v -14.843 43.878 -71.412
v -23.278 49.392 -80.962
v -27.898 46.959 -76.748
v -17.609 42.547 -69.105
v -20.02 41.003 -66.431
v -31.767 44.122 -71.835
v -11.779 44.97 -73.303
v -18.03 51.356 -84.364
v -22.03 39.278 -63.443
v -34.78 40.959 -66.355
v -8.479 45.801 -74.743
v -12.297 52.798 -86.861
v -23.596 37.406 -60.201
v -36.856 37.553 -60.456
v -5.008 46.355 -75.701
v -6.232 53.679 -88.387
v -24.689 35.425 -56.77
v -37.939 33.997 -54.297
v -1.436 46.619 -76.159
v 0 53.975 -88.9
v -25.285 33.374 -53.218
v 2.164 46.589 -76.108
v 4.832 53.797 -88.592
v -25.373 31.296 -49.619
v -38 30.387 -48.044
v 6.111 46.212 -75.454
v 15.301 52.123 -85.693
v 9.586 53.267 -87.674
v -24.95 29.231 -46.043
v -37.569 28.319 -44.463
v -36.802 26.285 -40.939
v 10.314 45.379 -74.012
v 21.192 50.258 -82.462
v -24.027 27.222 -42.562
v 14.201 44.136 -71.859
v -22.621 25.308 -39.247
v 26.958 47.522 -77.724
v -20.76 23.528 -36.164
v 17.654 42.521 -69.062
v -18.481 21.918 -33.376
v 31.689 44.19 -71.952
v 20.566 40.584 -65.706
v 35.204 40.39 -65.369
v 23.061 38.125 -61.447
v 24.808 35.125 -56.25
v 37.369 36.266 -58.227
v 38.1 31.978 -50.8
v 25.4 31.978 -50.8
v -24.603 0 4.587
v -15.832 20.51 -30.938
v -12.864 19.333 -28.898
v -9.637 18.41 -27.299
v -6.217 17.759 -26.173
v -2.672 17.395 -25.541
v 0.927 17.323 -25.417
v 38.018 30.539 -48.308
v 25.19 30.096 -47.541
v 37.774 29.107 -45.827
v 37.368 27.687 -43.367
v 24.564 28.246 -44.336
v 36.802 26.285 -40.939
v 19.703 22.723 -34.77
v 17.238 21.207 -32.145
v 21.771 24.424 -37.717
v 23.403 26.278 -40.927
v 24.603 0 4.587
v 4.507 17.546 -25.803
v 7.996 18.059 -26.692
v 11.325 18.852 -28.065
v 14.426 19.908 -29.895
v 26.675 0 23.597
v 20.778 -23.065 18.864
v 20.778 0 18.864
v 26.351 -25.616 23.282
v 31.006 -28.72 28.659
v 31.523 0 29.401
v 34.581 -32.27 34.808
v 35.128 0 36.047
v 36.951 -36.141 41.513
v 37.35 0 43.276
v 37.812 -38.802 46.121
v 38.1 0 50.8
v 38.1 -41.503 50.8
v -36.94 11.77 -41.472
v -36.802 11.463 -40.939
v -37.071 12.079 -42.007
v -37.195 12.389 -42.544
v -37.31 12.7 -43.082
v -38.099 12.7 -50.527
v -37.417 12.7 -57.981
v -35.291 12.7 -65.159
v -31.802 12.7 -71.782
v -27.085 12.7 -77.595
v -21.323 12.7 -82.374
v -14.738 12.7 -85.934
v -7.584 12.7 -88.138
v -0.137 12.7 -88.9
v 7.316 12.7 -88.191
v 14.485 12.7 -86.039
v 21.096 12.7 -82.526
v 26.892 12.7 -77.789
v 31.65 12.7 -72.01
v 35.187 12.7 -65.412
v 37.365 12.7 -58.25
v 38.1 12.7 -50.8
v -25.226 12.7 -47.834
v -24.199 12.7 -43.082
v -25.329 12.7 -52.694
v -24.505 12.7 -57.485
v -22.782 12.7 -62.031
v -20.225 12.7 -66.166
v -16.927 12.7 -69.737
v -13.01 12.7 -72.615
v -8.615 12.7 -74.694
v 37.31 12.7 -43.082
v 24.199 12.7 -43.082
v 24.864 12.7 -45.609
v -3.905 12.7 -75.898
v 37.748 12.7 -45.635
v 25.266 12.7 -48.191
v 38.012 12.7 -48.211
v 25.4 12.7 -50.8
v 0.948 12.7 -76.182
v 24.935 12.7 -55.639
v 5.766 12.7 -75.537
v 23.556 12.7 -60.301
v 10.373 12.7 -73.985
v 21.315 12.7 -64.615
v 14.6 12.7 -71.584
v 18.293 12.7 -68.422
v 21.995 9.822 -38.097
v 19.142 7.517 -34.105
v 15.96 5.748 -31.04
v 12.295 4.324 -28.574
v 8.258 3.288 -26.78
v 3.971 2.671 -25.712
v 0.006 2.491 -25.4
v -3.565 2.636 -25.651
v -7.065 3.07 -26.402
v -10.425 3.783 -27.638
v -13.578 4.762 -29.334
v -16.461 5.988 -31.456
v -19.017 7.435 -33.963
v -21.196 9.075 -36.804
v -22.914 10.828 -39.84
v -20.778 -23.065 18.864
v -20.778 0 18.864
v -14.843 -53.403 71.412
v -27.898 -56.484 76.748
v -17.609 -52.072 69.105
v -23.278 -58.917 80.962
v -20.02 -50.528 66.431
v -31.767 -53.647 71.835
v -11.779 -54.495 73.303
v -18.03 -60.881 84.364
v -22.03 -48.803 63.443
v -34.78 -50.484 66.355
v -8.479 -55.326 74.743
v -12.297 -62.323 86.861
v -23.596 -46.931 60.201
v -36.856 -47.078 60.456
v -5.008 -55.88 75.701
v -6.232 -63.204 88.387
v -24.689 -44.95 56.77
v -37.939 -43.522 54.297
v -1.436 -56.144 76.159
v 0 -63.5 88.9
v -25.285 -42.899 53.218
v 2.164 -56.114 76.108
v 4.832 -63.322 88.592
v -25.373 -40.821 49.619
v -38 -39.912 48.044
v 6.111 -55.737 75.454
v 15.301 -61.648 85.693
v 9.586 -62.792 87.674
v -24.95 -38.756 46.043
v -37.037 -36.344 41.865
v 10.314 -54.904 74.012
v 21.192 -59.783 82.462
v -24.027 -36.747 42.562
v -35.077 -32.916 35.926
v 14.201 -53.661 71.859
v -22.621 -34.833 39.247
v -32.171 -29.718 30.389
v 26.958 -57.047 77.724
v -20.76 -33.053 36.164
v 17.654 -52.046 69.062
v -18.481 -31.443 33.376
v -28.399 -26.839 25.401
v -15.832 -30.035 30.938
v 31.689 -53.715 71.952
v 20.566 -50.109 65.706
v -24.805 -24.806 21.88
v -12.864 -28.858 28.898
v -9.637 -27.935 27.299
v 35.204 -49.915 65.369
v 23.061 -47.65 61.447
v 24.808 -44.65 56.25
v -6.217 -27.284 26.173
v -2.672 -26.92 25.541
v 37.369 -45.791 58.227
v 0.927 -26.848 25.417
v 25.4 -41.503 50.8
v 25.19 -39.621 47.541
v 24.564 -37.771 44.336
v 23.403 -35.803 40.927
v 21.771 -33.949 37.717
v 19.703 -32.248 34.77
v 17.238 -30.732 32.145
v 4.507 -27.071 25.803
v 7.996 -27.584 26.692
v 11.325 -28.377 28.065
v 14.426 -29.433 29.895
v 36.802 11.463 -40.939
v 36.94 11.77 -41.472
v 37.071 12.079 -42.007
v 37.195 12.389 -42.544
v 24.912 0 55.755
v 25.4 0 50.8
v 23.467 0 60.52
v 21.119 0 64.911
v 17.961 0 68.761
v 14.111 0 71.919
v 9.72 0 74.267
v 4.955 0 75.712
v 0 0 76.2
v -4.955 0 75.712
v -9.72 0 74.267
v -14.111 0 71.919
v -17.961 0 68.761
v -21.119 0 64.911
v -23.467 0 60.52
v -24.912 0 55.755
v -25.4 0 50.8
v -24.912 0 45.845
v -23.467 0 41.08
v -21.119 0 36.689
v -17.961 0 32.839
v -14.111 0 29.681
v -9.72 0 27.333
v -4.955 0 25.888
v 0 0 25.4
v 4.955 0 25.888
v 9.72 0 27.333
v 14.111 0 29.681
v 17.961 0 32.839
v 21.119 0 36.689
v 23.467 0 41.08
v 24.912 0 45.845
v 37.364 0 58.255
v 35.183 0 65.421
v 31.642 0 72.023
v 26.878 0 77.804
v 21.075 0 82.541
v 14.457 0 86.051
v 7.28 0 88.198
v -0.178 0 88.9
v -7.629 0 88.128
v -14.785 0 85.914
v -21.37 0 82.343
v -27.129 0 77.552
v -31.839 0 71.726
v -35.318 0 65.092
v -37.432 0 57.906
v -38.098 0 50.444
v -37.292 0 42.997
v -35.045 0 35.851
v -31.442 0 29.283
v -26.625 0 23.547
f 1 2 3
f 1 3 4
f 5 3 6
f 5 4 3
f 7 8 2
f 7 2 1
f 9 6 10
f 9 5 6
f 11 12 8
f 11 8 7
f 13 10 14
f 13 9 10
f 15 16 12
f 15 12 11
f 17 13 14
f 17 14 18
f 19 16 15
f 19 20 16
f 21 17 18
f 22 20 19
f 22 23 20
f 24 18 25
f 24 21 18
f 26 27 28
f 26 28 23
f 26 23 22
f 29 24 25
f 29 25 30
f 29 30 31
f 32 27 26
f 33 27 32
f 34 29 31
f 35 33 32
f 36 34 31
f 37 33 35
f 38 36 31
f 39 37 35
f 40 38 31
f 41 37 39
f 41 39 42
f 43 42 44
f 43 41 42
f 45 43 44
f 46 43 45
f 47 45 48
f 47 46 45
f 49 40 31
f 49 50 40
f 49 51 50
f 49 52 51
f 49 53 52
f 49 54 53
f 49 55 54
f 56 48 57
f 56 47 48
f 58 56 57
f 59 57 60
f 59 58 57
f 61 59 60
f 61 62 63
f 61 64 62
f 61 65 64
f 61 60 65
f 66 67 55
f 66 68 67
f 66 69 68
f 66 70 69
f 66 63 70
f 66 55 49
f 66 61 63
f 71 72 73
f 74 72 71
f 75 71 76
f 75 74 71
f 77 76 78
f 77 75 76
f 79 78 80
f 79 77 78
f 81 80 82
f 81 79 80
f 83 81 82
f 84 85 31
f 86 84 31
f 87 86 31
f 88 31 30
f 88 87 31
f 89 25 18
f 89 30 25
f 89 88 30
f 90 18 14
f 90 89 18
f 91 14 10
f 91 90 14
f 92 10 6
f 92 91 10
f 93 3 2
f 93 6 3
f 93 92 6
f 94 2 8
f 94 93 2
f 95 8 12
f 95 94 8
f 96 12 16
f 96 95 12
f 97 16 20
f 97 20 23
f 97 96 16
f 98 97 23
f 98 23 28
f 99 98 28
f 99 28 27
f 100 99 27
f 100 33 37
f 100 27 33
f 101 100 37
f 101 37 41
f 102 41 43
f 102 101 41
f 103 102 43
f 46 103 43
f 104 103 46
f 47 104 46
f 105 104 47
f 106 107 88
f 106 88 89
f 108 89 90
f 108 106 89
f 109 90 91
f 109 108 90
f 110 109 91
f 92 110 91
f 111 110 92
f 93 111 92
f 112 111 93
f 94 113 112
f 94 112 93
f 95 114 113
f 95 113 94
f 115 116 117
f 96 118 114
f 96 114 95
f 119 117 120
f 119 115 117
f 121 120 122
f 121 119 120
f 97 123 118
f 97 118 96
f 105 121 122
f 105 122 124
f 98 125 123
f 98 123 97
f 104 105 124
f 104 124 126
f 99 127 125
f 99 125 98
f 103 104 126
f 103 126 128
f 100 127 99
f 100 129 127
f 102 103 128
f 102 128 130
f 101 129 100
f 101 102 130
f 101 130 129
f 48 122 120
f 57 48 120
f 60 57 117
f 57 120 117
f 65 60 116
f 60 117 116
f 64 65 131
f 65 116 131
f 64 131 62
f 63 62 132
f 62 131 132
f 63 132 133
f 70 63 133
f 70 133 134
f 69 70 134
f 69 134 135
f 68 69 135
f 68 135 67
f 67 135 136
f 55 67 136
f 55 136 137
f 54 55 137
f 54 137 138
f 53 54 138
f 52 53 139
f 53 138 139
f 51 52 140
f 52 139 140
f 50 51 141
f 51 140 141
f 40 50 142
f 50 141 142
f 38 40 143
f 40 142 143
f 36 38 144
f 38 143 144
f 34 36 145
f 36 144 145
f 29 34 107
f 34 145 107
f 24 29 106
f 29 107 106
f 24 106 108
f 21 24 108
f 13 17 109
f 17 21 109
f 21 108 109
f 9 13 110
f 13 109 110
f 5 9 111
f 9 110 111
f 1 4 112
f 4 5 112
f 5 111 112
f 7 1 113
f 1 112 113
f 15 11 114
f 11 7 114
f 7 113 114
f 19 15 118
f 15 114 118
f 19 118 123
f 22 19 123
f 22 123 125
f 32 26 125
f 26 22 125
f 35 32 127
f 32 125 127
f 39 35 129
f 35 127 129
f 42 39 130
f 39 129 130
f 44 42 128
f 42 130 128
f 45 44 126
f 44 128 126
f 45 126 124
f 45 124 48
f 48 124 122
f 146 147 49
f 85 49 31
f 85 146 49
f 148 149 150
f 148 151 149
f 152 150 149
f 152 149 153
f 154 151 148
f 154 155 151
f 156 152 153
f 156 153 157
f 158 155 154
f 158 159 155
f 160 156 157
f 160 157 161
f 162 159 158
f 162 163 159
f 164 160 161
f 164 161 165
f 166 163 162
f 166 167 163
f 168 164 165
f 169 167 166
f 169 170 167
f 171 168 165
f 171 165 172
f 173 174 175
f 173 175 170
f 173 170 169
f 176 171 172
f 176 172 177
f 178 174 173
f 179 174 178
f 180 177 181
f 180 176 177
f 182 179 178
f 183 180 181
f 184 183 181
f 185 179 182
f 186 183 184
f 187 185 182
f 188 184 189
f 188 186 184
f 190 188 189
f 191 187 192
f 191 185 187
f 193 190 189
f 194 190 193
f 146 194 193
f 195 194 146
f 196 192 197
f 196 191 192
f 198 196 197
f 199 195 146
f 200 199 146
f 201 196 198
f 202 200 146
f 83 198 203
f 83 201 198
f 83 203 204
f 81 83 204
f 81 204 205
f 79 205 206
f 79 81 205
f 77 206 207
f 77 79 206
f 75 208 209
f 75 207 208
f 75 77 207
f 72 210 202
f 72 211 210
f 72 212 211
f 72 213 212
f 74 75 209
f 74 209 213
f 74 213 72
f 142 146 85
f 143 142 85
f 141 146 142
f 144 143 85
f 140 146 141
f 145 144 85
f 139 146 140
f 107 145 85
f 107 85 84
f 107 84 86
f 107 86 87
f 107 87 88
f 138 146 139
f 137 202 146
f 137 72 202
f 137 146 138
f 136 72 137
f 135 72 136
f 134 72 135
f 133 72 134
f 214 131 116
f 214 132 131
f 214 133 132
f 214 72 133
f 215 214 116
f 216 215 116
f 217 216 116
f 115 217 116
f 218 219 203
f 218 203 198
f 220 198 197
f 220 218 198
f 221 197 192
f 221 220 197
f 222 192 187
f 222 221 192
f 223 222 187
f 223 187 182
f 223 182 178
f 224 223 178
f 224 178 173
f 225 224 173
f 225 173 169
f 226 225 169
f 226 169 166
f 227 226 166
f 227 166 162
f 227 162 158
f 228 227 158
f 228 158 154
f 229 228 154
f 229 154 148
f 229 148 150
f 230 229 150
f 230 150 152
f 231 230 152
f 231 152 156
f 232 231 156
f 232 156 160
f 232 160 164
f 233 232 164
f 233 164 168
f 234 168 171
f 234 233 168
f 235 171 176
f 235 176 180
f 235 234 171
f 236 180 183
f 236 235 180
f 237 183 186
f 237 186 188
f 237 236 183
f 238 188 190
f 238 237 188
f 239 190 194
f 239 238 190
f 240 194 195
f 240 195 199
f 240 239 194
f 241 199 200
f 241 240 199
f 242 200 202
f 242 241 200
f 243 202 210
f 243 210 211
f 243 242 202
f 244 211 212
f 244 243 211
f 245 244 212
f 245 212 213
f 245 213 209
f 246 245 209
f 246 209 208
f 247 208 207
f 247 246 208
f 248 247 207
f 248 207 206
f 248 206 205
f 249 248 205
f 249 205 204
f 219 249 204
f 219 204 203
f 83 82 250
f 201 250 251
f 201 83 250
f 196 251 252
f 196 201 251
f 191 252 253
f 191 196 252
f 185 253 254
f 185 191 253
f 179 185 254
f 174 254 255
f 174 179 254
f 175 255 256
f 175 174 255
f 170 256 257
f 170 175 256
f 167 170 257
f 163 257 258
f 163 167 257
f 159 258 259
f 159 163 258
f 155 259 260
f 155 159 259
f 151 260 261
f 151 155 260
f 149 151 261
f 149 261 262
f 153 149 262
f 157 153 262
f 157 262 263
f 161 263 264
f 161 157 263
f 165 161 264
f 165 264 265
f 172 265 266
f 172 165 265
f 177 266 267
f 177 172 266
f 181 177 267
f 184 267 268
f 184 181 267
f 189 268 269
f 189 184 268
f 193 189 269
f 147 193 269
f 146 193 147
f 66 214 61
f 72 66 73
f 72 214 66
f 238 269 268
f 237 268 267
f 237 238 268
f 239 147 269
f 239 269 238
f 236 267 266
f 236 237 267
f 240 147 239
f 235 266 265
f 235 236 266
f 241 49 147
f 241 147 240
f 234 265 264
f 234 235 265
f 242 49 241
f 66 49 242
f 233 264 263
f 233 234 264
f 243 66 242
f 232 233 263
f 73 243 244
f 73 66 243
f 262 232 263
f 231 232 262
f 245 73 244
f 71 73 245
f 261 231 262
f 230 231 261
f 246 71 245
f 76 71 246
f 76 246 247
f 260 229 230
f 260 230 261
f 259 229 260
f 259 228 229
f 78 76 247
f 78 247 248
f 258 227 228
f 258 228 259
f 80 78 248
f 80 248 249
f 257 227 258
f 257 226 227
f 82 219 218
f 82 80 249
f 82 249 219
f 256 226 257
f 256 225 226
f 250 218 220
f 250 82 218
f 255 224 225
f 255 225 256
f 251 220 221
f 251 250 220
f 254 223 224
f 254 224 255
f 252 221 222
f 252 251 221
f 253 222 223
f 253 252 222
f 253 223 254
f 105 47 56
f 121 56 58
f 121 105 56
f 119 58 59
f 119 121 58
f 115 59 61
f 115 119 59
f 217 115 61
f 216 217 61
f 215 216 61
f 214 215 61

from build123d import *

# Parameters (mm, degrees)
F0_R          = 25.4
F1_DEPTH      = 63.5
F1_DEPTH_BACK = 53.975
F3_DEPTH      = 50.8


with BuildPart() as f1:
    # F0 (on Front) → F1 (new body, two sides)
    with BuildSketch(Plane.XZ) as f1_sk:
        with BuildLine():
            ThreePointArc((-20.777584, 18.864096), (0, 12.7), (20.777584, 18.864096))
            ThreePointArc((20.777584, 18.864096), (33.490566, 32.634318), (38.1, 50.8))
            ThreePointArc((38.1, 50.8), (-18.165682, 84.290566), (-20.777584, 18.864096))
        make_face()
        with Locations((0, 50.8)):
            Circle(F0_R, mode=Mode.SUBTRACT)
        with BuildLine():
            ThreePointArc((-36.801774, -40.938994), (0, -12.7), (36.801774, -40.938994))
            Line((36.801774, -40.938994), (20.777584, 18.864096))
            ThreePointArc((20.777584, 18.864096), (0, 12.7), (-20.777584, 18.864096))
            Line((-20.777584, 18.864096), (-36.801774, -40.938994))
        make_face()
        with BuildLine():
            ThreePointArc((-36.801774, -40.938994), (-4.973048, -88.574049), (38.1, -50.8))
            ThreePointArc((38.1, -50.8), (37.774049, -45.826952), (36.801774, -40.938994))
            ThreePointArc((36.801774, -40.938994), (0, -12.7), (-36.801774, -40.938994))
        make_face()
        with Locations((0, -50.8)):
            Circle(F0_R, mode=Mode.SUBTRACT)
    extrude(amount=F1_DEPTH)
    extrude(f1_sk.sketch, amount=-F1_DEPTH_BACK)

    # F2 (on Right) → F3 (intersect, symmetric)
    with BuildSketch(Plane.YZ):
        Polygon((0, 88.9), (-63.5, 88.9), (12.7, -43.082272), (12.7, -88.9), (53.975, -88.9), (0, 4.587442), align=None)
    extrude(amount=F3_DEPTH, both=True, mode=Mode.INTERSECT)


solid = f1.part
